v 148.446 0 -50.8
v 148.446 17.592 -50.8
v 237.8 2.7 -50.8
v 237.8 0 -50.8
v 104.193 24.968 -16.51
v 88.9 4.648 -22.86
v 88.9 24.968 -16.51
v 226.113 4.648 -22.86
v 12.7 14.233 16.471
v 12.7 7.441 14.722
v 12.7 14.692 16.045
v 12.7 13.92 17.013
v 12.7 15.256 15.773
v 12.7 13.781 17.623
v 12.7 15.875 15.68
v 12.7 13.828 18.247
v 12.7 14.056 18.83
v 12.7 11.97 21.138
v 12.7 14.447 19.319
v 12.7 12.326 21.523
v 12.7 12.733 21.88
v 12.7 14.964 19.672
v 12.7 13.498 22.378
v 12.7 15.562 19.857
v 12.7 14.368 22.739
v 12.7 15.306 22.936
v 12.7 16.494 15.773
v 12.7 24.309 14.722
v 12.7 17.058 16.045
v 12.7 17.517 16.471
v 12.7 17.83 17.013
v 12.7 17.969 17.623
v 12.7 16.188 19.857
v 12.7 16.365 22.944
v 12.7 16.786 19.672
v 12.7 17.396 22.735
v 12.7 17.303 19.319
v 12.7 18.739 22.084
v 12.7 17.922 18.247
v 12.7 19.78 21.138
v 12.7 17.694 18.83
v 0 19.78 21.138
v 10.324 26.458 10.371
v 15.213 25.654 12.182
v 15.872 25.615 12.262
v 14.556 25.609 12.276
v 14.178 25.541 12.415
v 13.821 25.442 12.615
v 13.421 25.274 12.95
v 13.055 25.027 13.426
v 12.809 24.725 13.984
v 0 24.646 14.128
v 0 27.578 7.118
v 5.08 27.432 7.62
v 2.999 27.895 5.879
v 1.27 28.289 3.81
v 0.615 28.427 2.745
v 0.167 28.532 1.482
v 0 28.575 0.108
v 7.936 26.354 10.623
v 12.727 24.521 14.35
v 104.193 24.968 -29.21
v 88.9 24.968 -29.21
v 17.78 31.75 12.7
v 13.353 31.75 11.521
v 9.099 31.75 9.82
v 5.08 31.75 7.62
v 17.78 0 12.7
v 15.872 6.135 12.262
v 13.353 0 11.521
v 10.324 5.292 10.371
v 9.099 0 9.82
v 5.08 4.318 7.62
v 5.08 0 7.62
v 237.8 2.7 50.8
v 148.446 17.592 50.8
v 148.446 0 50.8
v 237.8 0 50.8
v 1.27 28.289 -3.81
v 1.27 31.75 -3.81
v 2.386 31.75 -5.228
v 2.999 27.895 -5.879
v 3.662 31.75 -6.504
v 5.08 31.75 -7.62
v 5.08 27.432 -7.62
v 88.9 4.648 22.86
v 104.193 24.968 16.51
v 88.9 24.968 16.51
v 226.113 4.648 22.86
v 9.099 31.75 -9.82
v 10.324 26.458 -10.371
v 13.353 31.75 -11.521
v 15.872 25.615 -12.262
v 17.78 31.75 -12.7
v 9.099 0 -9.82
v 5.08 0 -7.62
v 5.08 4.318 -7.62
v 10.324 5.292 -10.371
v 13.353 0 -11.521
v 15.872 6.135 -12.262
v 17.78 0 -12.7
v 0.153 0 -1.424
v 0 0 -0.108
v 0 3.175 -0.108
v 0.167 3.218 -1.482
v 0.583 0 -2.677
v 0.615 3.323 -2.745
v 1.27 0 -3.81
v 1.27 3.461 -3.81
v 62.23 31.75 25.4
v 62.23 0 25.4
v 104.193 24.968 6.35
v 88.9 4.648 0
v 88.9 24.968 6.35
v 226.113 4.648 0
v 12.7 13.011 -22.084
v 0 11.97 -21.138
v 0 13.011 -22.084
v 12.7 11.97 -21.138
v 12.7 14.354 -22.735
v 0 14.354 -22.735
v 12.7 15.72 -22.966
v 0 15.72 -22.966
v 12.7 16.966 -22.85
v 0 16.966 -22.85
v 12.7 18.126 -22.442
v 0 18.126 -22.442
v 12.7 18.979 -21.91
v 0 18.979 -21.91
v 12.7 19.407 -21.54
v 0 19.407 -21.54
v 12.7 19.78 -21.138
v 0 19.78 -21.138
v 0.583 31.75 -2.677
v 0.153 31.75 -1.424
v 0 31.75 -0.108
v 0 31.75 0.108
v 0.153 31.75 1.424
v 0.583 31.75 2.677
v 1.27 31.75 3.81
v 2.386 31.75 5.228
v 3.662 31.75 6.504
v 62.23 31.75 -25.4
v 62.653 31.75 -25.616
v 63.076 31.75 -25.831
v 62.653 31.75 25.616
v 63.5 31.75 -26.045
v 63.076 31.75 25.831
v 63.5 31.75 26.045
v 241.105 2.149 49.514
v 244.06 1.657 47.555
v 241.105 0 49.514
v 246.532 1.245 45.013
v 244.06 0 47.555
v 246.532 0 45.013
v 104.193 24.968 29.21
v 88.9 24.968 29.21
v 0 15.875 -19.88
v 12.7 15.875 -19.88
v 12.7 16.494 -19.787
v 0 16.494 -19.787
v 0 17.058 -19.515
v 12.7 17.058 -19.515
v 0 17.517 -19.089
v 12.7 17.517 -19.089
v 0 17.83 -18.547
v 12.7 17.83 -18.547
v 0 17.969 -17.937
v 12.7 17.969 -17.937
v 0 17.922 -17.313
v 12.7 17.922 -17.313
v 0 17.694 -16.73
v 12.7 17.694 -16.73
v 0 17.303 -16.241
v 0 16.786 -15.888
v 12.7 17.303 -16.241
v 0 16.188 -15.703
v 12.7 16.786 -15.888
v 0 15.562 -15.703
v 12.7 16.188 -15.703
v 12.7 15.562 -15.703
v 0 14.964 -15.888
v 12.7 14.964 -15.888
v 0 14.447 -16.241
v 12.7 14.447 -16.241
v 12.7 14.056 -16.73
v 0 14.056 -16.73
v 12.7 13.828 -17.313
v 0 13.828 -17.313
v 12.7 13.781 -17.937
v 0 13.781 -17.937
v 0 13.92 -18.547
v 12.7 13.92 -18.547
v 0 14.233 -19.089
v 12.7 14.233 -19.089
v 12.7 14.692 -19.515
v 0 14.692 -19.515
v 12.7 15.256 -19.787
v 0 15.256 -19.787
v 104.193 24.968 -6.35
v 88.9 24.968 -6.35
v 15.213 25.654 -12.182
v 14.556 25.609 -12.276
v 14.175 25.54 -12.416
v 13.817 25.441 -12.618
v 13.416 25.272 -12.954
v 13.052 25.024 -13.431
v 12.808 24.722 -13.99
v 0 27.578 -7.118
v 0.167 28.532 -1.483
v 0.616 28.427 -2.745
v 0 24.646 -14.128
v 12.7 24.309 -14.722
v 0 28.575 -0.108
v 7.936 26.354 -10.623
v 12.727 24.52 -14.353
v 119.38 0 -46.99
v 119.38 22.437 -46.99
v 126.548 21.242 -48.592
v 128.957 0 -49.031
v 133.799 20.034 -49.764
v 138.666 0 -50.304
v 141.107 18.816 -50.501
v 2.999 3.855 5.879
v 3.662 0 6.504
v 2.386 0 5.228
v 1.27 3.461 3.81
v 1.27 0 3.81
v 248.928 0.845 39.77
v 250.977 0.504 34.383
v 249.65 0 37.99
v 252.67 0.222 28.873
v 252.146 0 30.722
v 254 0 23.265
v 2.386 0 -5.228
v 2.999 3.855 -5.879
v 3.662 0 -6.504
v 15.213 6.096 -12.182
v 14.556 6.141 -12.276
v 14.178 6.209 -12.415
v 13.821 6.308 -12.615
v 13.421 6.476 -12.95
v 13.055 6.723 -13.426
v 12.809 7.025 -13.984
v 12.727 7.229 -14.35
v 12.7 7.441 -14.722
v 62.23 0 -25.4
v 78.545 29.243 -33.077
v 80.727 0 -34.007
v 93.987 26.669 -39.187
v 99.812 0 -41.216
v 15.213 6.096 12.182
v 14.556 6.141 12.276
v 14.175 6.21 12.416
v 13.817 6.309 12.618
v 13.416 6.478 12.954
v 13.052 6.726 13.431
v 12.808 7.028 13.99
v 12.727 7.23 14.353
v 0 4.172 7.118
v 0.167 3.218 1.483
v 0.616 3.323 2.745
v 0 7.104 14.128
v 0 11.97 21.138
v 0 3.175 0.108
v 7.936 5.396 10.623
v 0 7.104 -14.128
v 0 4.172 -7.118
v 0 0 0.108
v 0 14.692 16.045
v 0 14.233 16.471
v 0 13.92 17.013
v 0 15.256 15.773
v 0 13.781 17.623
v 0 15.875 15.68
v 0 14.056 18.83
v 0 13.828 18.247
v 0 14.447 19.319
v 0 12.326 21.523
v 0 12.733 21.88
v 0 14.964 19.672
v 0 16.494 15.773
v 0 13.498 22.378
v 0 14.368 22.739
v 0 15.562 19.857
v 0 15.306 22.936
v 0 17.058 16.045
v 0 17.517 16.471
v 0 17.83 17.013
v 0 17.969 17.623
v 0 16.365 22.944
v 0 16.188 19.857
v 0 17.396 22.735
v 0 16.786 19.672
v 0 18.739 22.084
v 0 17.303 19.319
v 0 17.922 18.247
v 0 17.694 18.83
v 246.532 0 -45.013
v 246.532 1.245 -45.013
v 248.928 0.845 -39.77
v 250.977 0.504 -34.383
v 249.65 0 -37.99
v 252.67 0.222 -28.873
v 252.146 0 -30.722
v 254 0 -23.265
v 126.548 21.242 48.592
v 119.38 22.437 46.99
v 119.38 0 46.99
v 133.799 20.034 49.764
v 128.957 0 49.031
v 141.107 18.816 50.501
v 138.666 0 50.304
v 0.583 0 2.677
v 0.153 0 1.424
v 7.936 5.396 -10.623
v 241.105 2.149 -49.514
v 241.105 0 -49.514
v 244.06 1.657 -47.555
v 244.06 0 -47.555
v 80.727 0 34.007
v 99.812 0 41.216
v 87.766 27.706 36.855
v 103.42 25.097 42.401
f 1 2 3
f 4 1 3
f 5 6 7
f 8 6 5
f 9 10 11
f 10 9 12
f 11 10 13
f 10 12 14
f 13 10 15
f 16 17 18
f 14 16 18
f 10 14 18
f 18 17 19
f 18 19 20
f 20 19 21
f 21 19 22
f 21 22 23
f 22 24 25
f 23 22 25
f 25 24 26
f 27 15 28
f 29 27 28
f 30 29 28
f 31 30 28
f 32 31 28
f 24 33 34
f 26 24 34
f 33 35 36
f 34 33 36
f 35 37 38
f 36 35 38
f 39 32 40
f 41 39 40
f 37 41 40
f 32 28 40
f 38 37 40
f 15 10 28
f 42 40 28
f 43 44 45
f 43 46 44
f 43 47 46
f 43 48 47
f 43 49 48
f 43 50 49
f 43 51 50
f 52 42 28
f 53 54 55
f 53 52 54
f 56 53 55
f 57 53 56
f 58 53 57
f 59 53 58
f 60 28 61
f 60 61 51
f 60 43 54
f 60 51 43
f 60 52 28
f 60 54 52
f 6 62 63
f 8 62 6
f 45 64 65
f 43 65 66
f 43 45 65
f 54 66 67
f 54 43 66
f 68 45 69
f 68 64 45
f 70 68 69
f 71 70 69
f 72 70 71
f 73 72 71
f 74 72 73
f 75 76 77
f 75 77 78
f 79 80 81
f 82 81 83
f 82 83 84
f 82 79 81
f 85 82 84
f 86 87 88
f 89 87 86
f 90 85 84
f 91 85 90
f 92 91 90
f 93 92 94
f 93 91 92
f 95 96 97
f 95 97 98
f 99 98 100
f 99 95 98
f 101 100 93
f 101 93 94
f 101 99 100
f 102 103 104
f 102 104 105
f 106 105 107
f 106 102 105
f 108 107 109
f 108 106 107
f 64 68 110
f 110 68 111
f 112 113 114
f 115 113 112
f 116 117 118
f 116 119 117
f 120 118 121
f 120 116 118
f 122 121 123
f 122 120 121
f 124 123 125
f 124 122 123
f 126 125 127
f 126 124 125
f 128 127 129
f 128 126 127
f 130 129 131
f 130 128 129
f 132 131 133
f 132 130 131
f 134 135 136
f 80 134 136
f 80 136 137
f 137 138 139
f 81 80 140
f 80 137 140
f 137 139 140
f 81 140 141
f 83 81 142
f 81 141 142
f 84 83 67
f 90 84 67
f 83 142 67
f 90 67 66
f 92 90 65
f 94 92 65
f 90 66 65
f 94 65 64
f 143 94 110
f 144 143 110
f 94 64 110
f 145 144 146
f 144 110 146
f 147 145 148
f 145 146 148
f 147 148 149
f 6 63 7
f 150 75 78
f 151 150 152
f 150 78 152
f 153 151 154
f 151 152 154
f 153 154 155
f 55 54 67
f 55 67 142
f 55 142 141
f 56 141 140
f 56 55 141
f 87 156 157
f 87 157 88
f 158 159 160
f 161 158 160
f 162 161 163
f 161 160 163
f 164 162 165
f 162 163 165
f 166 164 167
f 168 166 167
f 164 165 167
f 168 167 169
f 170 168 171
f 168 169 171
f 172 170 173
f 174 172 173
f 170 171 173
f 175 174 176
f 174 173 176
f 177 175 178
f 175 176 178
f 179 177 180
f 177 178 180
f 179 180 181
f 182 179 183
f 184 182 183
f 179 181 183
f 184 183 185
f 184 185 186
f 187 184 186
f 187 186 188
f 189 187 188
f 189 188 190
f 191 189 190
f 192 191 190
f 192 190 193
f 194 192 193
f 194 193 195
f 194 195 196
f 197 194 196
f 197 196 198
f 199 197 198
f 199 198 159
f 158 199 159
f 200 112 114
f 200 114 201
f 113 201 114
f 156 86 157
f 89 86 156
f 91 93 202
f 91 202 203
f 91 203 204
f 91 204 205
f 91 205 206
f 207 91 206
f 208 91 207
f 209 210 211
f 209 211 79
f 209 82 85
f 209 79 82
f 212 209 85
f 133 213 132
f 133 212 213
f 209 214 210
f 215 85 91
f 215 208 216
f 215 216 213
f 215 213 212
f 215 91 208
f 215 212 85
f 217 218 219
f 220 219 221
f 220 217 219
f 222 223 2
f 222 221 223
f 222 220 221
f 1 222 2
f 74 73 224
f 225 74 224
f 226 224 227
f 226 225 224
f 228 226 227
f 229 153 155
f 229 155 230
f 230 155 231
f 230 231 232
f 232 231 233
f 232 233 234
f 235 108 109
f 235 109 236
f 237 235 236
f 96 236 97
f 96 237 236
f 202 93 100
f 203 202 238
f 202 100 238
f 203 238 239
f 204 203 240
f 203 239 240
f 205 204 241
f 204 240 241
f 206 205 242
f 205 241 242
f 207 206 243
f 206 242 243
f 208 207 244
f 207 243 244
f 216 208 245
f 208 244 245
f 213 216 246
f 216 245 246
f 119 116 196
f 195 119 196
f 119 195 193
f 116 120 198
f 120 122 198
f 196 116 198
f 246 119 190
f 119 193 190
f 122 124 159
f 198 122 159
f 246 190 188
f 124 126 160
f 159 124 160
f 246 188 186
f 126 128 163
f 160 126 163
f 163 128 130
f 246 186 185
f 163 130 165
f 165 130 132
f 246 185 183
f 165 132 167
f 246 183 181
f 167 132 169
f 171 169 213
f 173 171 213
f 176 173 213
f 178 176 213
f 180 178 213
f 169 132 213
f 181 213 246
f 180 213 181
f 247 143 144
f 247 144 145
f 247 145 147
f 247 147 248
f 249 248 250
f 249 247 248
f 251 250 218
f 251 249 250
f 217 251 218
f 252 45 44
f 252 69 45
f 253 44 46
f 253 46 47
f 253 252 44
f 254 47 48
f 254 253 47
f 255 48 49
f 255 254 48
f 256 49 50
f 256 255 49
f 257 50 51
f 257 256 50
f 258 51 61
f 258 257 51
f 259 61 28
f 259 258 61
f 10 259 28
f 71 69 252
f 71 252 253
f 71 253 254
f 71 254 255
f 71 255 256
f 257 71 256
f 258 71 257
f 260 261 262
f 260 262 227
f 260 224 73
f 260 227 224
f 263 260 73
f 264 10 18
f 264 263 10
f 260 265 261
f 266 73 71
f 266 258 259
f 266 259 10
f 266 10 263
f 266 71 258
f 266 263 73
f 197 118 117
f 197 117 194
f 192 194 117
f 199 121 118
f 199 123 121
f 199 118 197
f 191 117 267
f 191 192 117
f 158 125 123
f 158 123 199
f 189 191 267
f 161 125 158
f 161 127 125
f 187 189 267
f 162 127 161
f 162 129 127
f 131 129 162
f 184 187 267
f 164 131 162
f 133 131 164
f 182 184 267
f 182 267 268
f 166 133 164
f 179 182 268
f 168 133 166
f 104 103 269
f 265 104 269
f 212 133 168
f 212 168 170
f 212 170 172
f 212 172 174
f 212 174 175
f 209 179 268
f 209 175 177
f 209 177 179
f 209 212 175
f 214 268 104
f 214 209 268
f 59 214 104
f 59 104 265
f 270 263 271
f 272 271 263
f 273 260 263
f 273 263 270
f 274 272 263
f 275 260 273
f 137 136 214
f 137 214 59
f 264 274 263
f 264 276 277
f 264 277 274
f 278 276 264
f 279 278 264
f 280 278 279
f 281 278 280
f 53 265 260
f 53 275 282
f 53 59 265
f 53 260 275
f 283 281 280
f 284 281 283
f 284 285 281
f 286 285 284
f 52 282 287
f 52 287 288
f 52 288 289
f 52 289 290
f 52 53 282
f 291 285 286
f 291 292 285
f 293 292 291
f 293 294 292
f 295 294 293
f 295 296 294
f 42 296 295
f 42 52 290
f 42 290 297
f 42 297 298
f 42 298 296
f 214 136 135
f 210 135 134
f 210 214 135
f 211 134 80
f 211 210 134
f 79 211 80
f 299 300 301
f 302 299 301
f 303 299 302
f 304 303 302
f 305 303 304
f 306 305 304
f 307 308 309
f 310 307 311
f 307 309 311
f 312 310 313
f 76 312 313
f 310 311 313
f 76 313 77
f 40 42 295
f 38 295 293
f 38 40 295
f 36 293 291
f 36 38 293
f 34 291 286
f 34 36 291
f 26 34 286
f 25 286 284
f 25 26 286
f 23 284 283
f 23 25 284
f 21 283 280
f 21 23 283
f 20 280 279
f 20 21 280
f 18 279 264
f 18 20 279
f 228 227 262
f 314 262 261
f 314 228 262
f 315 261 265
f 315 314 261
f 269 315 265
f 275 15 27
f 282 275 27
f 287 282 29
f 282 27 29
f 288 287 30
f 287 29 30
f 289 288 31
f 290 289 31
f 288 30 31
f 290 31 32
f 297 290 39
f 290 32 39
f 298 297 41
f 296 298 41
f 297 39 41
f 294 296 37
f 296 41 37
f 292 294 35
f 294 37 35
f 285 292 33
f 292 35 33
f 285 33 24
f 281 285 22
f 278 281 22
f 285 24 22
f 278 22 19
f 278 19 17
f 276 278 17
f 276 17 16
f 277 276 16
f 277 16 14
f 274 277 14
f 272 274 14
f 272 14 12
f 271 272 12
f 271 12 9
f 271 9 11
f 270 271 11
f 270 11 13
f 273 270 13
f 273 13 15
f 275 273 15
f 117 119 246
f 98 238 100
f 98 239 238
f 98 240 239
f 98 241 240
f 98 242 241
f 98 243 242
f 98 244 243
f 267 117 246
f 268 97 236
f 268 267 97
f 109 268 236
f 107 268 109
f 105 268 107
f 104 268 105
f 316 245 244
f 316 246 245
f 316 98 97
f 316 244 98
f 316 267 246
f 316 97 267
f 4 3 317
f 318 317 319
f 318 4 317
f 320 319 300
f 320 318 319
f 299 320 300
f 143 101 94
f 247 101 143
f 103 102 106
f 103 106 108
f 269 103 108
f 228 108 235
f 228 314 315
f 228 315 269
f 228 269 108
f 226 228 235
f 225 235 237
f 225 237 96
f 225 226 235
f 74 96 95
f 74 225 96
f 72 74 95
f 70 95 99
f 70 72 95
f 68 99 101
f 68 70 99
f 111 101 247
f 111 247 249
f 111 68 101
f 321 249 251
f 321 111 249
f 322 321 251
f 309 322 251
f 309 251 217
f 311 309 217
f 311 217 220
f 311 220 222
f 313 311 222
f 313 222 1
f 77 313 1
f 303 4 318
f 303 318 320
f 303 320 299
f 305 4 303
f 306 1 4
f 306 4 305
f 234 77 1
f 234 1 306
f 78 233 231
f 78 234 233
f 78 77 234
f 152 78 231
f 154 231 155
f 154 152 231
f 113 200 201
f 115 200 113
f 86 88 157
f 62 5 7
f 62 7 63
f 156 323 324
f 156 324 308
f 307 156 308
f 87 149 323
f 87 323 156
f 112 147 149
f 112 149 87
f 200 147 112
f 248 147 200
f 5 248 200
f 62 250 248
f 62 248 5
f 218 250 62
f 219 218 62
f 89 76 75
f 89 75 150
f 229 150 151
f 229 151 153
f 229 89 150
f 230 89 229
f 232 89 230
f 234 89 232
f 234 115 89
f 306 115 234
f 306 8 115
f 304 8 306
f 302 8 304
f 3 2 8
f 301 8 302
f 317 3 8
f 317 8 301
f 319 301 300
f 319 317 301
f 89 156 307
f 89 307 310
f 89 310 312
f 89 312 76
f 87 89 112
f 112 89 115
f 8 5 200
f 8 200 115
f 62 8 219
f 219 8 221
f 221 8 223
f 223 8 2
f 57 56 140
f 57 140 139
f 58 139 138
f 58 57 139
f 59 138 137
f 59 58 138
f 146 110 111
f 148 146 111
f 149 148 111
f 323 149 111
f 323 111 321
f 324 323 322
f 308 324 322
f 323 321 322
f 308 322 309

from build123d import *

# Parameters (mm, degrees)
SKETCH1_W               = 254
SKETCH1_H               = 31.75
BOSS_EXTRUDE1_DEPTH     = 50.8
CUT_EXTRUDE1_DEPTH      = 261.968776868
CUT_EXTRUDE1_DEPTH_BACK = 261.968776868
CUT_EXTRUDE2_DEPTH      = 261.968776868
CUT_EXTRUDE2_DEPTH_BACK = 101.6
CUT_EXTRUDE3_START      = -31.75
CUT_EXTRUDE3_DEPTH      = 31.75
CUT_EXTRUDE4_DEPTH      = 203.2
LPATTERN1_COUNT         = 2
LPATTERN1_PITCH         = 22.86
LPATTERN1_COL_COUNT     = 2
LPATTERN1_COL_PITCH     = 22.86
BOSS_EXTRUDE2_DEPTH     = 12.7
M5_TAPPED_HOLE1_D       = 4.2
M5_TAPPED_HOLE1_DEPTH   = 13.97
M5_TAPPED_HOLE1_TIP     = 1.2618073
FILLET1_R               = 2.54
FILLET2_R               = 5.08


# Read off the part's stored shape, not the designer's step: Cut-Extrude3
with BuildPart() as part:
    # Sketch1 → Boss-Extrude1 (new, symmetric)
    with BuildSketch(Plane.XY):
        with Locations((127, 15.875)):
            Rectangle(SKETCH1_W, SKETCH1_H)
    extrude(amount=BOSS_EXTRUDE1_DEPTH, both=True)

    # Sketch2 → Cut-Extrude1 (cut, two sides: drawn at the far end of the back side and taken through both)
    with BuildSketch(Plane.XY.offset(-CUT_EXTRUDE1_DEPTH_BACK)):
        Polygon((63.5, 31.75), (254, 0), (254, 31.75), align=None)
    extrude(amount=CUT_EXTRUDE1_DEPTH + CUT_EXTRUDE1_DEPTH_BACK, mode=Mode.SUBTRACT)

    # Sketch3 → Cut-Extrude2 (cut, two sides: drawn at the far end of the back side and taken through both)
    with BuildSketch(Plane(origin=(0, 0, 0), x_dir=(1, 0, 0), z_dir=(0, 1, 0)).offset(-CUT_EXTRUDE2_DEPTH_BACK)):
        with BuildLine():
            Line((17.78, 12.7), (17.78, 72.102848299))
            Line((17.78, 72.102848299), (-32.844059738, 72.102848299))
            Line((-32.844059738, 72.102848299), (-31.340021966, -58.533575325))
            Line((-31.340021966, -58.533575325), (17.78, -58.533575325))
            Line((17.78, -58.533575325), (17.78, -12.7))
            ThreePointArc((17.78, -12.7), (11.200161386, -10.734596536), (5.08, -7.62))
            ThreePointArc((5.08, -7.62), (3.005283766, -5.884716234), (1.27, -3.81))
            ThreePointArc((1.27, -3.81), (0.317306771, -2.010897743), (0, 0))
            ThreePointArc((0, 0), (0.317306771, 2.010897743), (1.27, 3.81))
            ThreePointArc((1.27, 3.81), (3.005283766, 5.884716234), (5.08, 7.62))
            ThreePointArc((5.08, 7.62), (11.200161386, 10.734596536), (17.78, 12.7))
        make_face()
    extrude(amount=CUT_EXTRUDE2_DEPTH + CUT_EXTRUDE2_DEPTH_BACK, mode=Mode.SUBTRACT)

    # Cut-Extrude3 outline → Cut-Extrude3 (cut)
    with BuildSketch(Plane(origin=(0, 31.75, 0), x_dir=(1, 0, 0), z_dir=(0, 1, 0)).offset(CUT_EXTRUDE3_START)):
        with BuildLine():
            Line((17.78, 12.7), (62.23, 25.4))
            ThreePointArc((62.23, 25.4), (90.202906045, 37.788778117), (119.38, 46.99))
            ThreePointArc((119.38, 46.99), (133.798896157, 49.763850575), (148.445575226, 50.8))
            Line((148.445575226, 50.8), (17.78, 50.8))
            Line((17.78, 50.8), (17.78, 12.7))
        make_face()
        with BuildLine():
            Line((255, 50.8), (237.800096312, 50.8))
            ThreePointArc((237.800096312, 50.8), (242.634955157, 48.613990909), (246.531625641, 45.012539127))
            ThreePointArc((246.531625641, 45.012539127), (250.977042308, 34.38284899), (254, 23.264676093))
            Line((254, 23.264676093), (255, 18.335620452))
            Line((255, 18.335620452), (255, 50.8))
        make_face()
    cut_extrude3 = extrude(amount=CUT_EXTRUDE3_DEPTH, mode=Mode.SUBTRACT)

    # Mirror2: Cut-Extrude3 across plane
    add(cut_extrude3.mirror(Plane.XY), mode=Mode.SUBTRACT)

    # Sketch7 → Cut-Extrude4 (cut)
    with BuildSketch(Plane(origin=(292.1, 0, 0), x_dir=(0, 0, -1), z_dir=(1, 0, 0))):
        Polygon((-6.35, 24.967833991), (6.35, 24.967833991), (0, 4.647833991), align=None)
    cut_extrude4 = extrude(amount=-CUT_EXTRUDE4_DEPTH, mode=Mode.SUBTRACT)

    # LPattern1: Cut-Extrude4 ×2
    with Locations(*[(0, 0, i * LPATTERN1_PITCH) for i in range(1, LPATTERN1_COUNT)]):
        add(cut_extrude4, mode=Mode.SUBTRACT)

    # LPattern1 col: Cut-Extrude4 ×2
    with Locations(*[(0, 0, -i * LPATTERN1_COL_PITCH) for i in range(1, LPATTERN1_COL_COUNT)]):
        add(cut_extrude4, mode=Mode.SUBTRACT)

    # Sketch9 → Boss-Extrude2 (add)
    with BuildSketch(Plane(origin=(0, 0, 0), x_dir=(0, 0, -1), z_dir=(1, 0, 0))):
        with BuildLine():
            add(Edge.make_bspline(
                [(-25.4, 15.875), (0, 41.275), (25.4, 15.875)],
                knots=[0, 0, 0, 1, 1, 1], degree=2))
            add(Edge.make_bspline(
                [(25.4, 15.875), (0, -9.525), (-25.4, 15.875)],
                knots=[0, 0, 0, 1, 1, 1], degree=2))
        make_face()
    extrude(amount=BOSS_EXTRUDE2_DEPTH)

    # M5 Tapped Hole1
    with Locations(Plane.ZY):
        with Locations((17.78, 15.875), (-17.78, 15.875)):
            Hole(M5_TAPPED_HOLE1_D / 2, depth=M5_TAPPED_HOLE1_DEPTH)
            with Locations((0, 0, -(M5_TAPPED_HOLE1_DEPTH + M5_TAPPED_HOLE1_TIP / 2))):  # 118° drill point
                Cone(0, M5_TAPPED_HOLE1_D / 2, M5_TAPPED_HOLE1_TIP, mode=Mode.SUBTRACT)

    # Fillet1
    fillet1_edges = [part.edges().sort_by_distance(p)[0] for p in [
        (12.7, 15.875, 11.298246193),
        (12.7, 15.875, -11.298246193),
    ]]
    fillet(fillet1_edges, radius=FILLET1_R)

    # Fillet2
    fillet2_edges = [part.edges().sort_by_distance(p)[0] for p in [
        (6.35, 15.875, -25.4),
        (6.35, 15.875, 25.4),
    ]]
    fillet(fillet2_edges, radius=FILLET2_R)


solid = part.part
